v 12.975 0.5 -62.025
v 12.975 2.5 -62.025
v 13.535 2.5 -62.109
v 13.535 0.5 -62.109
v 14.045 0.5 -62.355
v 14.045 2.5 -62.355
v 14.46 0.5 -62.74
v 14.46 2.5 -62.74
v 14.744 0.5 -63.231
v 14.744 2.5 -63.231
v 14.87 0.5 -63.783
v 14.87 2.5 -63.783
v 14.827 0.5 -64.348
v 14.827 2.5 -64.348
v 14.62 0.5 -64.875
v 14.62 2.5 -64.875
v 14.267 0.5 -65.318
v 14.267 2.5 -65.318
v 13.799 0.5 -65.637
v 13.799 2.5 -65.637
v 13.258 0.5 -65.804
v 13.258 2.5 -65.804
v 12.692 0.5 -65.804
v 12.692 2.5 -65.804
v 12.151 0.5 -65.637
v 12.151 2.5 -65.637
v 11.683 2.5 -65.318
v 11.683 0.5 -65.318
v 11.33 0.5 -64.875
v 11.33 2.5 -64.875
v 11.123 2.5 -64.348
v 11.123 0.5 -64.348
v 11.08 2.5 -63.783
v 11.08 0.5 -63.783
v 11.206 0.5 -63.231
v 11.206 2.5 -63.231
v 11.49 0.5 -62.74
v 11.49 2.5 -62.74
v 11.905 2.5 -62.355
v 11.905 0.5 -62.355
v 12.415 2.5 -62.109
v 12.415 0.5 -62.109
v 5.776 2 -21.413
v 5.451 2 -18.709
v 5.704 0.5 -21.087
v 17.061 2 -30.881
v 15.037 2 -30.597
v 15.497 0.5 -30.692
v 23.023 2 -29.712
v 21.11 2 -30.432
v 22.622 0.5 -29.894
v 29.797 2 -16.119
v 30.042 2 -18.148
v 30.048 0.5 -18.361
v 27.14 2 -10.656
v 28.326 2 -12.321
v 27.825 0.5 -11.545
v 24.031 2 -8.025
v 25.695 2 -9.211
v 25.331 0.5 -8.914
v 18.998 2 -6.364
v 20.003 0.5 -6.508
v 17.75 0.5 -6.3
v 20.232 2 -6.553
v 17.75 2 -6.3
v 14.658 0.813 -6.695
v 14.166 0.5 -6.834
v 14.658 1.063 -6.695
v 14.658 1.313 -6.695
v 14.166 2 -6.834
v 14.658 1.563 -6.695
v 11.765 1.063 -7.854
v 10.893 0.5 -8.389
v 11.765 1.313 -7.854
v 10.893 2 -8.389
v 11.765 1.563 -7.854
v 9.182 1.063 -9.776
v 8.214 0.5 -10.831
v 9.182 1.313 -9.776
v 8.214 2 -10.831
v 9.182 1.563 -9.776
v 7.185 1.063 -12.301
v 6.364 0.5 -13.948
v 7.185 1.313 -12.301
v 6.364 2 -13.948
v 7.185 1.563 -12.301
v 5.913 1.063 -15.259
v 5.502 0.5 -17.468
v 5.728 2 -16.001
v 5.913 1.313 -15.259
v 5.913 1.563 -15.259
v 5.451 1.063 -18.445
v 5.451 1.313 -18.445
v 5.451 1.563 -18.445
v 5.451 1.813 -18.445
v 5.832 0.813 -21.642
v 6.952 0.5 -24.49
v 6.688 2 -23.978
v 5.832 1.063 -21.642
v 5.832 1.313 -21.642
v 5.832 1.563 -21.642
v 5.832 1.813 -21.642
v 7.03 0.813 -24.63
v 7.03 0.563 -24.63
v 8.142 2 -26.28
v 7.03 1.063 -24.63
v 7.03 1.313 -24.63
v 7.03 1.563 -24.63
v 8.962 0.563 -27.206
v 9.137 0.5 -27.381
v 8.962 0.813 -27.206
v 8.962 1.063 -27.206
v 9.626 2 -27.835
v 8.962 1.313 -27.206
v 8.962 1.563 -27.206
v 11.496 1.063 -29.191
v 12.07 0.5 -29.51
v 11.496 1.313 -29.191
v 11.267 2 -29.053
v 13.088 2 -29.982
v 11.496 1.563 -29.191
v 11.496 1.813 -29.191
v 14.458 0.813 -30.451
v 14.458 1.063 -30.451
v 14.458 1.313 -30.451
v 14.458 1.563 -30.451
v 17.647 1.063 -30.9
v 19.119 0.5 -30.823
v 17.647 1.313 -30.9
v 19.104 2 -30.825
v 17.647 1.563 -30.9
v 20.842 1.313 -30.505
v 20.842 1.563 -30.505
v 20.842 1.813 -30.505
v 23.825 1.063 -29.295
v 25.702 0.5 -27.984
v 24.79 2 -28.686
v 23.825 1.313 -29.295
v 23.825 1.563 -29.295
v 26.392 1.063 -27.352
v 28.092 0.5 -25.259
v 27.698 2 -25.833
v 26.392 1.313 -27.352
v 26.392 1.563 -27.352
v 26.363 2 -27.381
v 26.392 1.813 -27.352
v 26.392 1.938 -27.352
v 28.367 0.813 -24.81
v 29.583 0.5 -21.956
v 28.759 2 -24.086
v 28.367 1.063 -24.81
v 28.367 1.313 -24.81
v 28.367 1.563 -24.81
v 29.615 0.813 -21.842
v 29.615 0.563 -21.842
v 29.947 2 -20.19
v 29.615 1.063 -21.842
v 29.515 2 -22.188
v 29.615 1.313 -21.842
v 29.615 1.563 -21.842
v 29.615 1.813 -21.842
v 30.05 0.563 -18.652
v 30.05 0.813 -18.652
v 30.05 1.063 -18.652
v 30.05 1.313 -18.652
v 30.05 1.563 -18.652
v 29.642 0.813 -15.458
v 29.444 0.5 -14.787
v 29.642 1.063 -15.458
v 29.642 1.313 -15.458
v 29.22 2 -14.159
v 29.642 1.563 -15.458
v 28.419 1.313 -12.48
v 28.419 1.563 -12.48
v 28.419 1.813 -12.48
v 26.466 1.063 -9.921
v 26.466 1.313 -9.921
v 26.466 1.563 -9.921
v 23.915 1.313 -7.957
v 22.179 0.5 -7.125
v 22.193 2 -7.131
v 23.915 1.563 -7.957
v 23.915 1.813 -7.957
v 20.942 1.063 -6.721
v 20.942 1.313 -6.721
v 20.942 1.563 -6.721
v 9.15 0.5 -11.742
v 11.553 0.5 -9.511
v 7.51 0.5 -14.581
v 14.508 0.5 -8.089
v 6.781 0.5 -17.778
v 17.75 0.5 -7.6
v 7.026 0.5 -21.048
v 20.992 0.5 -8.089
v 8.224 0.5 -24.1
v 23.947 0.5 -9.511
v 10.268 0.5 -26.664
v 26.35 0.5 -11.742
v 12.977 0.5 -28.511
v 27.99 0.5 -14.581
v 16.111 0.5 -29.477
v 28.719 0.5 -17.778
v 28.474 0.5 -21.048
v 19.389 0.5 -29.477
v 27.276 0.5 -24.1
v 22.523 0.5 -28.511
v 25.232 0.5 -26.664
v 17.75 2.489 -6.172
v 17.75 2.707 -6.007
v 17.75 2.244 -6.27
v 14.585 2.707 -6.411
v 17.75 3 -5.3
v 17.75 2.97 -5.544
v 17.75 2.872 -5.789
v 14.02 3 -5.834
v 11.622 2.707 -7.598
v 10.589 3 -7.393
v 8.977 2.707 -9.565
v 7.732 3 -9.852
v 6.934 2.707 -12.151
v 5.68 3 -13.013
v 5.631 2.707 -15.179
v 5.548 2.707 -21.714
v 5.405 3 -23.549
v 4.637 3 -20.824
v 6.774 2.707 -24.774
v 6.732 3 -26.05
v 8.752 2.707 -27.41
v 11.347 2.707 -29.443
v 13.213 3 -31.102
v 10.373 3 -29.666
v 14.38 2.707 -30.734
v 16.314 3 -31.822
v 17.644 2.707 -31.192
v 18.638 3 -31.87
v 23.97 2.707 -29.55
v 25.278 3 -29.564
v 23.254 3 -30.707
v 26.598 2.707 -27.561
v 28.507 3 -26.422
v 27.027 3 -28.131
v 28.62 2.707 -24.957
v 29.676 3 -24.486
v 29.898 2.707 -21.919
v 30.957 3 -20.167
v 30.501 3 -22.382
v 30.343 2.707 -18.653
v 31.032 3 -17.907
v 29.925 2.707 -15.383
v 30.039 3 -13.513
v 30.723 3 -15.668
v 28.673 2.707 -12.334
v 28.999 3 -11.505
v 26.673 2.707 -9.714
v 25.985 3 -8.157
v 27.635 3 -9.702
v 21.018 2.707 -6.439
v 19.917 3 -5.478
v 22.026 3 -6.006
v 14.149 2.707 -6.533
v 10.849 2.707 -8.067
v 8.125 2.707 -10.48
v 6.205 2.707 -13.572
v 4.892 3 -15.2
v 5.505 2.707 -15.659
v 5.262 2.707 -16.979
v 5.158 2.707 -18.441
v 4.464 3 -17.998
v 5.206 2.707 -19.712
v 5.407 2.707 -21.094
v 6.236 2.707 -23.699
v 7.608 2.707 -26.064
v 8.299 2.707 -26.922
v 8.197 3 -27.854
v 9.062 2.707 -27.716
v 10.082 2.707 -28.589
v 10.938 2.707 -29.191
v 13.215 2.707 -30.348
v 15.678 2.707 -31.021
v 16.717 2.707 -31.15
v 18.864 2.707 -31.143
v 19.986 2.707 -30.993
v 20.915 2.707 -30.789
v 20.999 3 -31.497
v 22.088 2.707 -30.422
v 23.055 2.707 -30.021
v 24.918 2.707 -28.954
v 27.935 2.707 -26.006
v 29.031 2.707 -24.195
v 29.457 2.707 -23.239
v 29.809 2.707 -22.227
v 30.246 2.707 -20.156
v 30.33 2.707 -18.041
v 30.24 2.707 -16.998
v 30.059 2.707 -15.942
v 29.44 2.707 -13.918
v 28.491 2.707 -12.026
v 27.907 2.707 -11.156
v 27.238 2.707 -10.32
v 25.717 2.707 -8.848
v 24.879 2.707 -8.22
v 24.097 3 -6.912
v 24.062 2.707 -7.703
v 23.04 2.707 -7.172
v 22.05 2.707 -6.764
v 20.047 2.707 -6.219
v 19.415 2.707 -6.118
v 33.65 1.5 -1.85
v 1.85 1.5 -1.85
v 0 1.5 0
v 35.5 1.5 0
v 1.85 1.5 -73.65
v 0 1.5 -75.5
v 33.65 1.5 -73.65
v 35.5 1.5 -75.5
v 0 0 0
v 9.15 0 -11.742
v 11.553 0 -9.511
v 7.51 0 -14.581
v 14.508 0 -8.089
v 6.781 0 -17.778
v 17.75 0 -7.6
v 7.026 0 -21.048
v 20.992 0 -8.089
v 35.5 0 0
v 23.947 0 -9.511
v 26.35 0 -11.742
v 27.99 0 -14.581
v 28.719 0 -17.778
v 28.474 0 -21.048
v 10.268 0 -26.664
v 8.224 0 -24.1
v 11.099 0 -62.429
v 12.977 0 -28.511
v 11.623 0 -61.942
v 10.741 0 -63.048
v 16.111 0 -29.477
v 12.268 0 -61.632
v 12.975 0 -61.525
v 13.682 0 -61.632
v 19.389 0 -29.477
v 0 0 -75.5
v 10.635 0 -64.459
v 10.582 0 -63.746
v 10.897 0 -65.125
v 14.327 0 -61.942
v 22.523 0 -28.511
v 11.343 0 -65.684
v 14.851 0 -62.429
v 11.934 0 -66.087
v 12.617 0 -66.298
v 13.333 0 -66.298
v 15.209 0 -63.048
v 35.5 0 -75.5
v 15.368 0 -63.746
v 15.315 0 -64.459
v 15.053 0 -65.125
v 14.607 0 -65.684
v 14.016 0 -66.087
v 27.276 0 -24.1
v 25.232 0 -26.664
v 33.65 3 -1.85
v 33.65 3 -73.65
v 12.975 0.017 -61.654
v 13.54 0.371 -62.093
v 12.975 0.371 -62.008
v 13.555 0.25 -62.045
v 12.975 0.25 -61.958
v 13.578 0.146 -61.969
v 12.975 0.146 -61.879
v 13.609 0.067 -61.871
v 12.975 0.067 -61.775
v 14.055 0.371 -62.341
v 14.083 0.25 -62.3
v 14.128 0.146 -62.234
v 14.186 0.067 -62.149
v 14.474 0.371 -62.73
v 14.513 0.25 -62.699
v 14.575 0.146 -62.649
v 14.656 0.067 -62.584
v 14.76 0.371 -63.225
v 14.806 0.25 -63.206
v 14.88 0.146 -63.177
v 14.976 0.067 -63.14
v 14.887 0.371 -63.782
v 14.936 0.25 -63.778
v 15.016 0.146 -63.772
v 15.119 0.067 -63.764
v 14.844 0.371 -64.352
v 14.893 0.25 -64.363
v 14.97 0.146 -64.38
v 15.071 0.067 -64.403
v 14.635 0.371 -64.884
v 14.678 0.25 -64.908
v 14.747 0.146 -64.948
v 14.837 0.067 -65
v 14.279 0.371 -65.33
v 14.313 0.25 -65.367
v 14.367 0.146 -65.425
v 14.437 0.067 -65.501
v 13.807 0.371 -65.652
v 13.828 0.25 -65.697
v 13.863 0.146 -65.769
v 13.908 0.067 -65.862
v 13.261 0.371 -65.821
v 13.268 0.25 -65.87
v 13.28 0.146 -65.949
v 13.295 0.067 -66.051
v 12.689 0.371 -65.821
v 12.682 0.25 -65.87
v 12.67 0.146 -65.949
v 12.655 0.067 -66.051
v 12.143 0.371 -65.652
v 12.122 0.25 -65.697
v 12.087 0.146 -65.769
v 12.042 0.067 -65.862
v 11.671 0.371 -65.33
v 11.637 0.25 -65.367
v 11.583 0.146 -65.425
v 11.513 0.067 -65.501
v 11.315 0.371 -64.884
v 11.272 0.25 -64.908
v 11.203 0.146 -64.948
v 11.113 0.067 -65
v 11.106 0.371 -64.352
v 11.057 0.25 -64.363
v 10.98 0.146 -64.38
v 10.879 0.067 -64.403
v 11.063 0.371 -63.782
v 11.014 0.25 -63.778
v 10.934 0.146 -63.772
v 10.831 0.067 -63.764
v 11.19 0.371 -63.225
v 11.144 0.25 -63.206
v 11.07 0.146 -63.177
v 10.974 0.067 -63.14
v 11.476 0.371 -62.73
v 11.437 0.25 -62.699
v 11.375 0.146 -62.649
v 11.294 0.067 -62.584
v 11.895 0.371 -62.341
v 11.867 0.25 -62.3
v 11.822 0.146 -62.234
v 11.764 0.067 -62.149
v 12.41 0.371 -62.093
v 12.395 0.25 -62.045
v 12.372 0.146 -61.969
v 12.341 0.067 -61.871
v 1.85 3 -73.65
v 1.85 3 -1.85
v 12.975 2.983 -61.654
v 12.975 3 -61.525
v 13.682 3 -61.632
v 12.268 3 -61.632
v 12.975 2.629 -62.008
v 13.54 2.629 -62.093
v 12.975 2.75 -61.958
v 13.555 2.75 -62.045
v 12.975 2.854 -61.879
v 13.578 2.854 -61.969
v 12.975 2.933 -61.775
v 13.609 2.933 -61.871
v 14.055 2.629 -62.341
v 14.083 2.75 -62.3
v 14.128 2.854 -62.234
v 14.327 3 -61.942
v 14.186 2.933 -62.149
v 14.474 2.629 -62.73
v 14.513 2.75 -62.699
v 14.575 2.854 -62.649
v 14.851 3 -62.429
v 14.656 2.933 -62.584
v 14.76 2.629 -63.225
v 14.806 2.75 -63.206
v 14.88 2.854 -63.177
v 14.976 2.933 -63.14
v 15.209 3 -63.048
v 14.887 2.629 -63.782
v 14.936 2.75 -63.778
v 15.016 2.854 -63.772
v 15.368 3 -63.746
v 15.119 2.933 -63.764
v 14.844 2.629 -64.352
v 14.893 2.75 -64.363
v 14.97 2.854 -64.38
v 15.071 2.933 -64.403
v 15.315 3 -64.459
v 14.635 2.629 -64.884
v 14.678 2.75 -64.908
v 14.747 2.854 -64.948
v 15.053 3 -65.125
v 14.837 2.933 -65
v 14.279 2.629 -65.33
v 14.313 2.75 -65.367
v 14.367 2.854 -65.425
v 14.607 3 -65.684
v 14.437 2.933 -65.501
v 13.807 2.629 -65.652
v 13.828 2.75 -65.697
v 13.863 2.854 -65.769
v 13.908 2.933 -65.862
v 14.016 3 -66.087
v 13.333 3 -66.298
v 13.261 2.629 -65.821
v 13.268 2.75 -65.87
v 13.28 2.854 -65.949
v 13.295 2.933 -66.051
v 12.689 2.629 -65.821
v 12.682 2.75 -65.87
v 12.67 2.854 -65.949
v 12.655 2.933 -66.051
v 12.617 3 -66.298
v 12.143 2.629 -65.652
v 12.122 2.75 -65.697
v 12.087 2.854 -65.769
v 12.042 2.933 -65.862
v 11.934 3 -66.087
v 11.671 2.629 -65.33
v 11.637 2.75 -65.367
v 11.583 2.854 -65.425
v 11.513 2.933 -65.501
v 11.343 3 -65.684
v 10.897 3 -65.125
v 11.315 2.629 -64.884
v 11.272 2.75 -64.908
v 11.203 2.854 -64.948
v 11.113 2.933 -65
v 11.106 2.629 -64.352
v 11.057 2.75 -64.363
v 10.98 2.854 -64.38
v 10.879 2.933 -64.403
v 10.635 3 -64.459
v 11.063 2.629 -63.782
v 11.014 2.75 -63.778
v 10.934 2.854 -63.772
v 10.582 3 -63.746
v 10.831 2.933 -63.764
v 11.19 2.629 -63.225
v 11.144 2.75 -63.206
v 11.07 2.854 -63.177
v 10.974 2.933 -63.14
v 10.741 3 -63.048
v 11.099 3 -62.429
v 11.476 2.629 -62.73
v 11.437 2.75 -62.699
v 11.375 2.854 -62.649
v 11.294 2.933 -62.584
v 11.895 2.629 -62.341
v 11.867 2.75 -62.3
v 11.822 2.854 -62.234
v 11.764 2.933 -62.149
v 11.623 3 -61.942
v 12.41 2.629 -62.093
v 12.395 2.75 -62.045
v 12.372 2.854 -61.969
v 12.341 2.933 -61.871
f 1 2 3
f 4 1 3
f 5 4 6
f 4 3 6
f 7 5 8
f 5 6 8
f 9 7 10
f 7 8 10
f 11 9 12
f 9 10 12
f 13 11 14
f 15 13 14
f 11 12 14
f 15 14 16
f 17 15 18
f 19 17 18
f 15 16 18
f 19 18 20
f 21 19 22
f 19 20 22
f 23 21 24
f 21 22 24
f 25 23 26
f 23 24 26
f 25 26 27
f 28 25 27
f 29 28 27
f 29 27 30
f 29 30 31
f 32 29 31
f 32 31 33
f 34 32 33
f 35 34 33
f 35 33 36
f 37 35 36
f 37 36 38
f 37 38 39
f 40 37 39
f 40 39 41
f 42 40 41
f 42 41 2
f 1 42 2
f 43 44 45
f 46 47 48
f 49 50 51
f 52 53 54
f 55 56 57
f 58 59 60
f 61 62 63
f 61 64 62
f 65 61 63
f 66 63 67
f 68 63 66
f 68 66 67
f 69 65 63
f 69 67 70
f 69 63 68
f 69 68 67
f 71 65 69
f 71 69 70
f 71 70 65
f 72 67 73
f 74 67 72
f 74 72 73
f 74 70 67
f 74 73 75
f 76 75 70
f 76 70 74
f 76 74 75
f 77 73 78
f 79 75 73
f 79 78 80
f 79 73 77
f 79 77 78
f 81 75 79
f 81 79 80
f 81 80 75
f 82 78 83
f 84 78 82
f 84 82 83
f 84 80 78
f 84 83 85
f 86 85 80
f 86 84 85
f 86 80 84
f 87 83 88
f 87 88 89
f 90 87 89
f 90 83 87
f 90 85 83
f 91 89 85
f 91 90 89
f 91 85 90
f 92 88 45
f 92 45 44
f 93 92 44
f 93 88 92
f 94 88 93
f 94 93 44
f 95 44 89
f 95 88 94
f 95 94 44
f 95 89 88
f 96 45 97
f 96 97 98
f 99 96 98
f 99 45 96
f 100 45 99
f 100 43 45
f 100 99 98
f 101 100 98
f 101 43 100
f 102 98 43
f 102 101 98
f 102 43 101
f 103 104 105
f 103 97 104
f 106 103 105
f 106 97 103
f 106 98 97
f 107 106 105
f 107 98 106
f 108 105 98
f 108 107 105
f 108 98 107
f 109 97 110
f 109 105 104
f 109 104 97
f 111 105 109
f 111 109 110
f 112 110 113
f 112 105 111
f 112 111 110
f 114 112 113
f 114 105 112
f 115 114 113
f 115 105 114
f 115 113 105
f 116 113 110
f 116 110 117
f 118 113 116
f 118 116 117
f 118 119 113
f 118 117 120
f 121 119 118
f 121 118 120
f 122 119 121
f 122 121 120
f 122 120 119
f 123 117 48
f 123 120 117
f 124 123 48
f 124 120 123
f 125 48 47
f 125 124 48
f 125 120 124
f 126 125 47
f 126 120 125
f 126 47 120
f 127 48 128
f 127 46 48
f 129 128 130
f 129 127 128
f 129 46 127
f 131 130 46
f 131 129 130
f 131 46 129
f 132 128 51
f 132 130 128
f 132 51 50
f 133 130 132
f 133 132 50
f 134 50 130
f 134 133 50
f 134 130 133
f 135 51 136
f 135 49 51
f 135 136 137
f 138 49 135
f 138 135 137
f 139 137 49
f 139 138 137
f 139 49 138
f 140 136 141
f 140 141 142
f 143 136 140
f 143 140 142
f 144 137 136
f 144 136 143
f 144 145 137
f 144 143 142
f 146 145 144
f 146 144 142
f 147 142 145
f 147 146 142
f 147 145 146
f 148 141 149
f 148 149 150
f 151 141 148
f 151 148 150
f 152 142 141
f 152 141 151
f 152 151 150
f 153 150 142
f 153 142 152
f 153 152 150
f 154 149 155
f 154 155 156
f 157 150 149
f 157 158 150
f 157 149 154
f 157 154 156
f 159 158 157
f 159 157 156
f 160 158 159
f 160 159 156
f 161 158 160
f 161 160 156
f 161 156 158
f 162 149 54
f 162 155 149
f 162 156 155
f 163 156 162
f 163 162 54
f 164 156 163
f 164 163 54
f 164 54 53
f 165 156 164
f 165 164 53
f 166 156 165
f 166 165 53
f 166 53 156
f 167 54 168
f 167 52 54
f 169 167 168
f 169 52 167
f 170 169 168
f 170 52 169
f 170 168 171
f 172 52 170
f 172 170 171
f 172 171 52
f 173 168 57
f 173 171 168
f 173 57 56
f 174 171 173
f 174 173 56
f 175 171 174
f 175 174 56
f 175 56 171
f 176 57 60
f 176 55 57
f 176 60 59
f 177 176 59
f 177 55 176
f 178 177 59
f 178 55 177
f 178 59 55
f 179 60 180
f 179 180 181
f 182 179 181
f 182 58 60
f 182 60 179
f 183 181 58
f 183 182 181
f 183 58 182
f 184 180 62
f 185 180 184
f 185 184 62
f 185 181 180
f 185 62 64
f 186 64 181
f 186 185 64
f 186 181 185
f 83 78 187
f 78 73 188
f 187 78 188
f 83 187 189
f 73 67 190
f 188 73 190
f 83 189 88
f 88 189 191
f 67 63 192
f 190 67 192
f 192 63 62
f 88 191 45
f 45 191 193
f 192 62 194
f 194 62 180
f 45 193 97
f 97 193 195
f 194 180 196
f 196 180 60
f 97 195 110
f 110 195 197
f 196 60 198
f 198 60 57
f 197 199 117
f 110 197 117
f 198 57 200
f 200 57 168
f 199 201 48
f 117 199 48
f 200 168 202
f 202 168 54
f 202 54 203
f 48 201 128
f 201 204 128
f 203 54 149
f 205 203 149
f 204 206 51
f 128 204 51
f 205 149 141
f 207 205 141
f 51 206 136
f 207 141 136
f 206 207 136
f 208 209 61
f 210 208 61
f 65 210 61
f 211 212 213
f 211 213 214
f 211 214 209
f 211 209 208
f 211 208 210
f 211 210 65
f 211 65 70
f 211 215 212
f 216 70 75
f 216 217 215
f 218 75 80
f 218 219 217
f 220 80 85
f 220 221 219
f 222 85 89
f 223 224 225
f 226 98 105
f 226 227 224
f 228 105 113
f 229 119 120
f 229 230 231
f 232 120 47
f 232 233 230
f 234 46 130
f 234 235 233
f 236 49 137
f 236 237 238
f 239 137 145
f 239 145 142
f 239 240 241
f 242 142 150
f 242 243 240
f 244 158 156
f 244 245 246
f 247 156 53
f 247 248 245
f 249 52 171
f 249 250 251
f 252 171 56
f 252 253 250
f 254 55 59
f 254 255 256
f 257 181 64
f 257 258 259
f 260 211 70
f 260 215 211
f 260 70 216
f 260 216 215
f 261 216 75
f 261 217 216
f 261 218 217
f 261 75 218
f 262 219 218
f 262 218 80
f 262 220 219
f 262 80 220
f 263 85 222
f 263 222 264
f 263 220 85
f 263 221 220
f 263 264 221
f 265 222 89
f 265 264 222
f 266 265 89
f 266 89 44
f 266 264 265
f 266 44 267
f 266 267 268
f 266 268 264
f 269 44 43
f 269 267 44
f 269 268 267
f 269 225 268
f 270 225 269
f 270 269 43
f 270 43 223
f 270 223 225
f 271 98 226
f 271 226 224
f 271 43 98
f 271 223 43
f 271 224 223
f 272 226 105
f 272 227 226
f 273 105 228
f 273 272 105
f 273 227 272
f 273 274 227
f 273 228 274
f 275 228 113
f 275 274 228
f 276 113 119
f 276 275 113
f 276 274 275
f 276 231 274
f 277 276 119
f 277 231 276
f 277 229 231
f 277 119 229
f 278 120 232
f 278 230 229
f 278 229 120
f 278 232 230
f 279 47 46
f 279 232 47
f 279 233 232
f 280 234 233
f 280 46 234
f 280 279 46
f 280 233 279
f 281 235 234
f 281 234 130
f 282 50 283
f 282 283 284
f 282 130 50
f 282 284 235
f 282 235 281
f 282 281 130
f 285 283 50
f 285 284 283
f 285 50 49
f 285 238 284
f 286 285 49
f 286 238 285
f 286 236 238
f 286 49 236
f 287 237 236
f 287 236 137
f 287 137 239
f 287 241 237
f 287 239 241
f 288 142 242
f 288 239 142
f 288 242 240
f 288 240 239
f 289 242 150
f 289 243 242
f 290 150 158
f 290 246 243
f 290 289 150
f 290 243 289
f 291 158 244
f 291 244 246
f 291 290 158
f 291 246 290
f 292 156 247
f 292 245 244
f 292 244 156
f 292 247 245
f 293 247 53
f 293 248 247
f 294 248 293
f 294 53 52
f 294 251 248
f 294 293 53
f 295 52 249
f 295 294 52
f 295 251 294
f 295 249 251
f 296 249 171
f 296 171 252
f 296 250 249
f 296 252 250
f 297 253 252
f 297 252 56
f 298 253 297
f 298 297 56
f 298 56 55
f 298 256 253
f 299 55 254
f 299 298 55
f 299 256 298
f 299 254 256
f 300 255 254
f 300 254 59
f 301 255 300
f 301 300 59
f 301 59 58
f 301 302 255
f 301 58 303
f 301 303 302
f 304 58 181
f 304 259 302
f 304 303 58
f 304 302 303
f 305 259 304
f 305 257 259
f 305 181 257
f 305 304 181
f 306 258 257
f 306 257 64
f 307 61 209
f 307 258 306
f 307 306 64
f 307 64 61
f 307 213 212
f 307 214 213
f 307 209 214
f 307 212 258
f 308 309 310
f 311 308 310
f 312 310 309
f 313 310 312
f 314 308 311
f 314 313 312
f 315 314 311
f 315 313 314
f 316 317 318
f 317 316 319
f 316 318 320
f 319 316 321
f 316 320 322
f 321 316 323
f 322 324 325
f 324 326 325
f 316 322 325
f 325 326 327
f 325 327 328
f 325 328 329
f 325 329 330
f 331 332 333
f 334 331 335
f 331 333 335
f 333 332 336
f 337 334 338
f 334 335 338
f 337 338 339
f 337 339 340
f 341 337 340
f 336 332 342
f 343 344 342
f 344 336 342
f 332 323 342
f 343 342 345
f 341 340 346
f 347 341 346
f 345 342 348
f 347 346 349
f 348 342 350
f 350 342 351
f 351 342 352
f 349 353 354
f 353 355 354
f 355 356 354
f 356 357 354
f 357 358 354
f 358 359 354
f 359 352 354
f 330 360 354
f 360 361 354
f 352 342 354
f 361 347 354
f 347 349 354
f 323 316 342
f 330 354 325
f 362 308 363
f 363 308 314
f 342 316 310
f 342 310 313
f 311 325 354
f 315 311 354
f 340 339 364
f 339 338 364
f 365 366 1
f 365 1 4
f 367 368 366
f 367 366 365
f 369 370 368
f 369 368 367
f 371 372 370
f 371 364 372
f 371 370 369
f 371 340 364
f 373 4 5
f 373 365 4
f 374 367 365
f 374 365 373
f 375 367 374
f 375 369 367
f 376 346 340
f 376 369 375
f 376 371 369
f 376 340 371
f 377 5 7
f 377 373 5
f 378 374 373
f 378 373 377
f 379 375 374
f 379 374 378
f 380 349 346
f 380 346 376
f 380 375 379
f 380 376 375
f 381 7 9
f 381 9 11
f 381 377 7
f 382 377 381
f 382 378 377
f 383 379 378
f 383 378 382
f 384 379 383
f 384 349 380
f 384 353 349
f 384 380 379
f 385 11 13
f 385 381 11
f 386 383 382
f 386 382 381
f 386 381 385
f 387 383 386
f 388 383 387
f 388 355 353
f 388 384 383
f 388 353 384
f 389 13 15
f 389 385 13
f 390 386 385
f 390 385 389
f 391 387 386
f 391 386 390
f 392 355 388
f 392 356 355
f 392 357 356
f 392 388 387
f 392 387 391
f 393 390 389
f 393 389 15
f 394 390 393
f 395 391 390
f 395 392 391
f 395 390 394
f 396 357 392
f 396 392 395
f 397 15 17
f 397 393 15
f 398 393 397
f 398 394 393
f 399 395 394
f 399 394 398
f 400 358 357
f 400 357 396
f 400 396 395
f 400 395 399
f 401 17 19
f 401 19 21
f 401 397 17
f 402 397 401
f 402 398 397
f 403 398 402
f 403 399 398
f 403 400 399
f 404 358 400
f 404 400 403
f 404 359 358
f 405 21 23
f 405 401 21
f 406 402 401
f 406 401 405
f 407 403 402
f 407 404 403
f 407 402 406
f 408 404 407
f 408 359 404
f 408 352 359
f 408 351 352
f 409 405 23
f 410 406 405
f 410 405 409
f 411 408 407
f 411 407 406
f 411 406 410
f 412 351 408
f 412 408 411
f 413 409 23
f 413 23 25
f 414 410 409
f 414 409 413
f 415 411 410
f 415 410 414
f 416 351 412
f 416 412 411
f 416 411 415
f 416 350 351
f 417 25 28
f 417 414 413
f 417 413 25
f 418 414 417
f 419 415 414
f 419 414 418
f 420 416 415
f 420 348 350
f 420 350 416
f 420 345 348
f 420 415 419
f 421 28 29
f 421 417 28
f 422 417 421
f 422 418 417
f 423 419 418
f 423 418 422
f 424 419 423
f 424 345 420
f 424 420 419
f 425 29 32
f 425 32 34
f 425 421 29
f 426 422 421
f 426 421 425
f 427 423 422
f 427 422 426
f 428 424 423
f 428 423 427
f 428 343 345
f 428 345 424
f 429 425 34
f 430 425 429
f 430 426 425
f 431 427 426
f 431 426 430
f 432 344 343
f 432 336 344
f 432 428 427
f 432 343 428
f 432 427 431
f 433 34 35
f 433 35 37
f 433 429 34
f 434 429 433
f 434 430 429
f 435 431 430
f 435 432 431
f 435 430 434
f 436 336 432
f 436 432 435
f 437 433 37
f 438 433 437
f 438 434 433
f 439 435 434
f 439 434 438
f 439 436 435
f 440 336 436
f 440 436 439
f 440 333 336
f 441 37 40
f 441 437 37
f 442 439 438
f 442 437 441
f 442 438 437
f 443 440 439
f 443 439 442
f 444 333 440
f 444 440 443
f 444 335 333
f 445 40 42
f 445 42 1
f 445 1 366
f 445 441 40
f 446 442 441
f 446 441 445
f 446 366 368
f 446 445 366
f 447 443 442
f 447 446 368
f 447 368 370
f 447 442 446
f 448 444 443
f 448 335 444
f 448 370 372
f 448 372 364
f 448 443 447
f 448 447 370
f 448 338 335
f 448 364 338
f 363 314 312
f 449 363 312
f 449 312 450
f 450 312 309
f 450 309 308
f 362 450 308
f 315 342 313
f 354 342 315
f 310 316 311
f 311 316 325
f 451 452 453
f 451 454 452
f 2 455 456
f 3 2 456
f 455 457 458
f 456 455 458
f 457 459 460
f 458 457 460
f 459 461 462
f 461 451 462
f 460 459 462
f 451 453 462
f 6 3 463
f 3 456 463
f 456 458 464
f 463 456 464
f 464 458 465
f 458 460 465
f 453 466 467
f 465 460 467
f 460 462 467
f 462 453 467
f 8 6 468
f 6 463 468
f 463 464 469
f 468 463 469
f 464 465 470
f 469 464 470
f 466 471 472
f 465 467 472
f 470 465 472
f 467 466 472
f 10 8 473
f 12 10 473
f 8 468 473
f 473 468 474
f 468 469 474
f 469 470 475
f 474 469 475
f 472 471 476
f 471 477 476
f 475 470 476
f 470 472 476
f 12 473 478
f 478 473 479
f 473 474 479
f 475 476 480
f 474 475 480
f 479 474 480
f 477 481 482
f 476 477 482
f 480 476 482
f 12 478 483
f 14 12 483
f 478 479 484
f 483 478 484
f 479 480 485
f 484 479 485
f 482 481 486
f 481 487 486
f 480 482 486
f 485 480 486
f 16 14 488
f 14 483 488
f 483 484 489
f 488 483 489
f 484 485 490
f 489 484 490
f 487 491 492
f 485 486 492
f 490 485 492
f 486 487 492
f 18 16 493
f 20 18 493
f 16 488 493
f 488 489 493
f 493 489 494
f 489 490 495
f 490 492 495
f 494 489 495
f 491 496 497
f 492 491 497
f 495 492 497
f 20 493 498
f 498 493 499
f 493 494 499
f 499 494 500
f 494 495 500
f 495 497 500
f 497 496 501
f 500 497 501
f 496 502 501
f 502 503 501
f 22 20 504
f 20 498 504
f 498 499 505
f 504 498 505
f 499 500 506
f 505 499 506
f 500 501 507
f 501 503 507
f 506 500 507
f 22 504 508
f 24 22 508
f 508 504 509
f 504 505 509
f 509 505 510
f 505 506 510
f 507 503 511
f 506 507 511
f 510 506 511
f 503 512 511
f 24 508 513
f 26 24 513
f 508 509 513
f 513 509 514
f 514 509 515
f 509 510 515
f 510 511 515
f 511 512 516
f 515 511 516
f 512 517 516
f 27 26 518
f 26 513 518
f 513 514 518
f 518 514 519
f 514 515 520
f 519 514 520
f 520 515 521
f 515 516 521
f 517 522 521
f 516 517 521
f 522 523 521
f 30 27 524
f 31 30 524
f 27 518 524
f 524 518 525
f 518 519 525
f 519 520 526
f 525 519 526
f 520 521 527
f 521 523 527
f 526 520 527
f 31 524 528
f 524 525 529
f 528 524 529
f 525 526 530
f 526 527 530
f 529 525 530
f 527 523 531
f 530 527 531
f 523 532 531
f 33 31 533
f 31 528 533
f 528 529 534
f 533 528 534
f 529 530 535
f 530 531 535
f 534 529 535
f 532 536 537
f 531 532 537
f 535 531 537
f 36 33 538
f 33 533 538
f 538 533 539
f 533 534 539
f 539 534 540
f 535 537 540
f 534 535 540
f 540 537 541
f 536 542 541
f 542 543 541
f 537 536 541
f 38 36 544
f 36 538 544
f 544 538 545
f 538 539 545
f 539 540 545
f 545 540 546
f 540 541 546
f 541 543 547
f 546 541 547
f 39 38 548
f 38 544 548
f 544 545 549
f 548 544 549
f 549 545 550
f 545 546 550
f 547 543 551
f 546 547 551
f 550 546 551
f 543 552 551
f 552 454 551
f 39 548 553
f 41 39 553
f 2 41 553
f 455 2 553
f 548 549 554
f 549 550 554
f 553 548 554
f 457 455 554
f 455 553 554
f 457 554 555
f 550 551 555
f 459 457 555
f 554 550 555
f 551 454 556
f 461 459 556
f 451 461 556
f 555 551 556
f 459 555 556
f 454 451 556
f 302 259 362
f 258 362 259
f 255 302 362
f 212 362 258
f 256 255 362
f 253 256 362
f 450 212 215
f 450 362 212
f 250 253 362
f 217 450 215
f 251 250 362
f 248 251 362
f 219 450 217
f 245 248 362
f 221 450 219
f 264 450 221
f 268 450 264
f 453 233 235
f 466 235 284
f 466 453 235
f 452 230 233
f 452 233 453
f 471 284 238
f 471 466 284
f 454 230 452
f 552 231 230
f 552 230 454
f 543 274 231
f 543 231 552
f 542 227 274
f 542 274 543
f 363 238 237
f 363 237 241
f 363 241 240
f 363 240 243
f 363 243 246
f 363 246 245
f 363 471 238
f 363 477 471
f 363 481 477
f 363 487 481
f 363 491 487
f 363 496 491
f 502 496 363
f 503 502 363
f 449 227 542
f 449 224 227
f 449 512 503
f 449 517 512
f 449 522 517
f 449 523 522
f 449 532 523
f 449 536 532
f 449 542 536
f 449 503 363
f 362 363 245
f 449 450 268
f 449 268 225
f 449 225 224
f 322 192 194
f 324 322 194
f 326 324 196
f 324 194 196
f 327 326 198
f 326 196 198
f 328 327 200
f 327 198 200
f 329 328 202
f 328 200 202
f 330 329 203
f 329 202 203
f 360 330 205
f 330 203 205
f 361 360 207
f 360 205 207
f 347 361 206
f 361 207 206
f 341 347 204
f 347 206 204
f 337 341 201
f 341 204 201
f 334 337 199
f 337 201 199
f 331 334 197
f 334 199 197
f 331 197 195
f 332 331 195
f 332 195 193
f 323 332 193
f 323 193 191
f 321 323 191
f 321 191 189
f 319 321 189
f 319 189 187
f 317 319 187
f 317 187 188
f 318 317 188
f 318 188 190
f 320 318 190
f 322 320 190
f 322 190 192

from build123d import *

# Parameters (mm, degrees)
SKETCH1_W           = 35.5
SKETCH1_H           = 75.5
BOSS_EXTRUDE1_DEPTH = 1.5
BOSS_EXTRUDE2_DEPTH = 1.5
SKETCH2_R           = 11
CUT_EXTRUDE1_DEPTH  = 10
CUT_EXTRUDE2_DEPTH  = 2.5
SKETCH4_R           = 1.9
CUT_EXTRUDE3_DEPTH  = 6
FILLET1_R           = 0.5
FILLET2_R           = 0.5
FILLET3_R           = 1


with BuildPart() as part:
    # Sketch1 → Boss-Extrude1 (new body)
    with BuildSketch(Plane(origin=(0, 0, 0), x_dir=(1, 0, 0), z_dir=(0, 1, 0))):
        with Locations((17.75, 37.75)):
            Rectangle(SKETCH1_W, SKETCH1_H)
    extrude(amount=BOSS_EXTRUDE1_DEPTH)

    # 3DSketch1 → Boss-Extrude2 (add)
    with BuildSketch(Plane(origin=(1.85, 1.5, -1.85), x_dir=(0.40495657653791334, 0, -0.9143359180950364), z_dir=(0, 1, 0))):
        Polygon((0, 0), (12.877619134, -29.075882195), (78.526938053, 0), (65.649318919, 29.075882195), align=None)
    extrude(amount=BOSS_EXTRUDE2_DEPTH)

    # Sketch2 → Cut-Extrude1 (cut)
    with BuildSketch(Plane(origin=(0, 3, 0), x_dir=(1, 0, 0), z_dir=(0, 1, 0))):
        with Locations(Location((17.75, 18.6, 0), (0, 0, 270))):
            Circle(SKETCH2_R)
    extrude(amount=-CUT_EXTRUDE1_DEPTH, mode=Mode.SUBTRACT)

    # 3DSketch2 → Cut-Extrude2 (cut)
    with BuildSketch(Plane(origin=(17.75, 3, -6.3), x_dir=(-0.004227803372085647, 0, -0.9999910627993868), z_dir=(0, -1, 0))):
        with BuildLine():
            add(Edge.make_bspline(
                [(0, 0), (0.004386995, -1.04174525), (0.27944755, -3.123987084), (1.476453938, -6.075565296), (3.410311469, -8.653144172), (5.973707785, -10.661776555), (8.970625928, -11.936313966), (12.195586401, -12.389659387), (15.427695721, -11.99044335), (18.445556685, -10.766344357), (21.042285232, -8.800917271), (23.040178447, -6.229084123), (24.302092158, -3.226838845), (24.741880785, 0), (24.329080551, 3.230402285), (23.092306587, 6.243090971), (21.115981025, 8.831534564), (18.535772158, 10.818599013), (15.528248734, 12.067881173), (12.299589709, 12.494101301), (9.070951129, 12.06772549), (6.063488405, 10.818297059), (3.483374022, 8.831111933), (1.507182222, 6.242560327), (0.270527087, 3.229871892), (-0.004531746, 1.07611808), (0, 0)],
                knots=[0, 0, 0, 0, 0.04044329, 0.080893626, 0.122671197, 0.164448751, 0.206226312, 0.248003874, 0.289781435, 0.331558997, 0.373336558, 0.415114119, 0.456891681, 0.498669242, 0.540446803, 0.582224365, 0.624001926, 0.665779488, 0.707557049, 0.74933461, 0.791112172, 0.832889733, 0.874667296, 0.916444855, 0.958222266, 1, 1, 1, 1], degree=3))
        make_face()
    extrude(amount=CUT_EXTRUDE2_DEPTH, mode=Mode.SUBTRACT)

    # Sketch4 → Cut-Extrude3 (cut)
    with BuildSketch(Plane(origin=(0, 3, 0), x_dir=(1, 0, 0), z_dir=(0, 1, 0))):
        with Locations(Location((12.975, 63.925, 0), (0, 0, 270))):
            Circle(SKETCH4_R)
    extrude(amount=-CUT_EXTRUDE3_DEPTH, mode=Mode.SUBTRACT)

    # Fillet1
    fillet1_edges = [part.edges().sort_by_distance(p)[0] for p in [
        (12.975, 3, -65.825),
    ]]
    fillet(fillet1_edges, radius=FILLET1_R)

    # Fillet2
    fillet2_edges = [part.edges().sort_by_distance(p)[0] for p in [
        (12.975, 0, -65.825),
    ]]
    fillet(fillet2_edges, radius=FILLET2_R)

    # Fillet3
    fillet3_edges = [part.edges().sort_by_distance(p)[0] for p in [
        (17.749997791, 3, -30.899997542),
    ]]
    fillet(fillet3_edges, radius=FILLET3_R)


solid = part.part
